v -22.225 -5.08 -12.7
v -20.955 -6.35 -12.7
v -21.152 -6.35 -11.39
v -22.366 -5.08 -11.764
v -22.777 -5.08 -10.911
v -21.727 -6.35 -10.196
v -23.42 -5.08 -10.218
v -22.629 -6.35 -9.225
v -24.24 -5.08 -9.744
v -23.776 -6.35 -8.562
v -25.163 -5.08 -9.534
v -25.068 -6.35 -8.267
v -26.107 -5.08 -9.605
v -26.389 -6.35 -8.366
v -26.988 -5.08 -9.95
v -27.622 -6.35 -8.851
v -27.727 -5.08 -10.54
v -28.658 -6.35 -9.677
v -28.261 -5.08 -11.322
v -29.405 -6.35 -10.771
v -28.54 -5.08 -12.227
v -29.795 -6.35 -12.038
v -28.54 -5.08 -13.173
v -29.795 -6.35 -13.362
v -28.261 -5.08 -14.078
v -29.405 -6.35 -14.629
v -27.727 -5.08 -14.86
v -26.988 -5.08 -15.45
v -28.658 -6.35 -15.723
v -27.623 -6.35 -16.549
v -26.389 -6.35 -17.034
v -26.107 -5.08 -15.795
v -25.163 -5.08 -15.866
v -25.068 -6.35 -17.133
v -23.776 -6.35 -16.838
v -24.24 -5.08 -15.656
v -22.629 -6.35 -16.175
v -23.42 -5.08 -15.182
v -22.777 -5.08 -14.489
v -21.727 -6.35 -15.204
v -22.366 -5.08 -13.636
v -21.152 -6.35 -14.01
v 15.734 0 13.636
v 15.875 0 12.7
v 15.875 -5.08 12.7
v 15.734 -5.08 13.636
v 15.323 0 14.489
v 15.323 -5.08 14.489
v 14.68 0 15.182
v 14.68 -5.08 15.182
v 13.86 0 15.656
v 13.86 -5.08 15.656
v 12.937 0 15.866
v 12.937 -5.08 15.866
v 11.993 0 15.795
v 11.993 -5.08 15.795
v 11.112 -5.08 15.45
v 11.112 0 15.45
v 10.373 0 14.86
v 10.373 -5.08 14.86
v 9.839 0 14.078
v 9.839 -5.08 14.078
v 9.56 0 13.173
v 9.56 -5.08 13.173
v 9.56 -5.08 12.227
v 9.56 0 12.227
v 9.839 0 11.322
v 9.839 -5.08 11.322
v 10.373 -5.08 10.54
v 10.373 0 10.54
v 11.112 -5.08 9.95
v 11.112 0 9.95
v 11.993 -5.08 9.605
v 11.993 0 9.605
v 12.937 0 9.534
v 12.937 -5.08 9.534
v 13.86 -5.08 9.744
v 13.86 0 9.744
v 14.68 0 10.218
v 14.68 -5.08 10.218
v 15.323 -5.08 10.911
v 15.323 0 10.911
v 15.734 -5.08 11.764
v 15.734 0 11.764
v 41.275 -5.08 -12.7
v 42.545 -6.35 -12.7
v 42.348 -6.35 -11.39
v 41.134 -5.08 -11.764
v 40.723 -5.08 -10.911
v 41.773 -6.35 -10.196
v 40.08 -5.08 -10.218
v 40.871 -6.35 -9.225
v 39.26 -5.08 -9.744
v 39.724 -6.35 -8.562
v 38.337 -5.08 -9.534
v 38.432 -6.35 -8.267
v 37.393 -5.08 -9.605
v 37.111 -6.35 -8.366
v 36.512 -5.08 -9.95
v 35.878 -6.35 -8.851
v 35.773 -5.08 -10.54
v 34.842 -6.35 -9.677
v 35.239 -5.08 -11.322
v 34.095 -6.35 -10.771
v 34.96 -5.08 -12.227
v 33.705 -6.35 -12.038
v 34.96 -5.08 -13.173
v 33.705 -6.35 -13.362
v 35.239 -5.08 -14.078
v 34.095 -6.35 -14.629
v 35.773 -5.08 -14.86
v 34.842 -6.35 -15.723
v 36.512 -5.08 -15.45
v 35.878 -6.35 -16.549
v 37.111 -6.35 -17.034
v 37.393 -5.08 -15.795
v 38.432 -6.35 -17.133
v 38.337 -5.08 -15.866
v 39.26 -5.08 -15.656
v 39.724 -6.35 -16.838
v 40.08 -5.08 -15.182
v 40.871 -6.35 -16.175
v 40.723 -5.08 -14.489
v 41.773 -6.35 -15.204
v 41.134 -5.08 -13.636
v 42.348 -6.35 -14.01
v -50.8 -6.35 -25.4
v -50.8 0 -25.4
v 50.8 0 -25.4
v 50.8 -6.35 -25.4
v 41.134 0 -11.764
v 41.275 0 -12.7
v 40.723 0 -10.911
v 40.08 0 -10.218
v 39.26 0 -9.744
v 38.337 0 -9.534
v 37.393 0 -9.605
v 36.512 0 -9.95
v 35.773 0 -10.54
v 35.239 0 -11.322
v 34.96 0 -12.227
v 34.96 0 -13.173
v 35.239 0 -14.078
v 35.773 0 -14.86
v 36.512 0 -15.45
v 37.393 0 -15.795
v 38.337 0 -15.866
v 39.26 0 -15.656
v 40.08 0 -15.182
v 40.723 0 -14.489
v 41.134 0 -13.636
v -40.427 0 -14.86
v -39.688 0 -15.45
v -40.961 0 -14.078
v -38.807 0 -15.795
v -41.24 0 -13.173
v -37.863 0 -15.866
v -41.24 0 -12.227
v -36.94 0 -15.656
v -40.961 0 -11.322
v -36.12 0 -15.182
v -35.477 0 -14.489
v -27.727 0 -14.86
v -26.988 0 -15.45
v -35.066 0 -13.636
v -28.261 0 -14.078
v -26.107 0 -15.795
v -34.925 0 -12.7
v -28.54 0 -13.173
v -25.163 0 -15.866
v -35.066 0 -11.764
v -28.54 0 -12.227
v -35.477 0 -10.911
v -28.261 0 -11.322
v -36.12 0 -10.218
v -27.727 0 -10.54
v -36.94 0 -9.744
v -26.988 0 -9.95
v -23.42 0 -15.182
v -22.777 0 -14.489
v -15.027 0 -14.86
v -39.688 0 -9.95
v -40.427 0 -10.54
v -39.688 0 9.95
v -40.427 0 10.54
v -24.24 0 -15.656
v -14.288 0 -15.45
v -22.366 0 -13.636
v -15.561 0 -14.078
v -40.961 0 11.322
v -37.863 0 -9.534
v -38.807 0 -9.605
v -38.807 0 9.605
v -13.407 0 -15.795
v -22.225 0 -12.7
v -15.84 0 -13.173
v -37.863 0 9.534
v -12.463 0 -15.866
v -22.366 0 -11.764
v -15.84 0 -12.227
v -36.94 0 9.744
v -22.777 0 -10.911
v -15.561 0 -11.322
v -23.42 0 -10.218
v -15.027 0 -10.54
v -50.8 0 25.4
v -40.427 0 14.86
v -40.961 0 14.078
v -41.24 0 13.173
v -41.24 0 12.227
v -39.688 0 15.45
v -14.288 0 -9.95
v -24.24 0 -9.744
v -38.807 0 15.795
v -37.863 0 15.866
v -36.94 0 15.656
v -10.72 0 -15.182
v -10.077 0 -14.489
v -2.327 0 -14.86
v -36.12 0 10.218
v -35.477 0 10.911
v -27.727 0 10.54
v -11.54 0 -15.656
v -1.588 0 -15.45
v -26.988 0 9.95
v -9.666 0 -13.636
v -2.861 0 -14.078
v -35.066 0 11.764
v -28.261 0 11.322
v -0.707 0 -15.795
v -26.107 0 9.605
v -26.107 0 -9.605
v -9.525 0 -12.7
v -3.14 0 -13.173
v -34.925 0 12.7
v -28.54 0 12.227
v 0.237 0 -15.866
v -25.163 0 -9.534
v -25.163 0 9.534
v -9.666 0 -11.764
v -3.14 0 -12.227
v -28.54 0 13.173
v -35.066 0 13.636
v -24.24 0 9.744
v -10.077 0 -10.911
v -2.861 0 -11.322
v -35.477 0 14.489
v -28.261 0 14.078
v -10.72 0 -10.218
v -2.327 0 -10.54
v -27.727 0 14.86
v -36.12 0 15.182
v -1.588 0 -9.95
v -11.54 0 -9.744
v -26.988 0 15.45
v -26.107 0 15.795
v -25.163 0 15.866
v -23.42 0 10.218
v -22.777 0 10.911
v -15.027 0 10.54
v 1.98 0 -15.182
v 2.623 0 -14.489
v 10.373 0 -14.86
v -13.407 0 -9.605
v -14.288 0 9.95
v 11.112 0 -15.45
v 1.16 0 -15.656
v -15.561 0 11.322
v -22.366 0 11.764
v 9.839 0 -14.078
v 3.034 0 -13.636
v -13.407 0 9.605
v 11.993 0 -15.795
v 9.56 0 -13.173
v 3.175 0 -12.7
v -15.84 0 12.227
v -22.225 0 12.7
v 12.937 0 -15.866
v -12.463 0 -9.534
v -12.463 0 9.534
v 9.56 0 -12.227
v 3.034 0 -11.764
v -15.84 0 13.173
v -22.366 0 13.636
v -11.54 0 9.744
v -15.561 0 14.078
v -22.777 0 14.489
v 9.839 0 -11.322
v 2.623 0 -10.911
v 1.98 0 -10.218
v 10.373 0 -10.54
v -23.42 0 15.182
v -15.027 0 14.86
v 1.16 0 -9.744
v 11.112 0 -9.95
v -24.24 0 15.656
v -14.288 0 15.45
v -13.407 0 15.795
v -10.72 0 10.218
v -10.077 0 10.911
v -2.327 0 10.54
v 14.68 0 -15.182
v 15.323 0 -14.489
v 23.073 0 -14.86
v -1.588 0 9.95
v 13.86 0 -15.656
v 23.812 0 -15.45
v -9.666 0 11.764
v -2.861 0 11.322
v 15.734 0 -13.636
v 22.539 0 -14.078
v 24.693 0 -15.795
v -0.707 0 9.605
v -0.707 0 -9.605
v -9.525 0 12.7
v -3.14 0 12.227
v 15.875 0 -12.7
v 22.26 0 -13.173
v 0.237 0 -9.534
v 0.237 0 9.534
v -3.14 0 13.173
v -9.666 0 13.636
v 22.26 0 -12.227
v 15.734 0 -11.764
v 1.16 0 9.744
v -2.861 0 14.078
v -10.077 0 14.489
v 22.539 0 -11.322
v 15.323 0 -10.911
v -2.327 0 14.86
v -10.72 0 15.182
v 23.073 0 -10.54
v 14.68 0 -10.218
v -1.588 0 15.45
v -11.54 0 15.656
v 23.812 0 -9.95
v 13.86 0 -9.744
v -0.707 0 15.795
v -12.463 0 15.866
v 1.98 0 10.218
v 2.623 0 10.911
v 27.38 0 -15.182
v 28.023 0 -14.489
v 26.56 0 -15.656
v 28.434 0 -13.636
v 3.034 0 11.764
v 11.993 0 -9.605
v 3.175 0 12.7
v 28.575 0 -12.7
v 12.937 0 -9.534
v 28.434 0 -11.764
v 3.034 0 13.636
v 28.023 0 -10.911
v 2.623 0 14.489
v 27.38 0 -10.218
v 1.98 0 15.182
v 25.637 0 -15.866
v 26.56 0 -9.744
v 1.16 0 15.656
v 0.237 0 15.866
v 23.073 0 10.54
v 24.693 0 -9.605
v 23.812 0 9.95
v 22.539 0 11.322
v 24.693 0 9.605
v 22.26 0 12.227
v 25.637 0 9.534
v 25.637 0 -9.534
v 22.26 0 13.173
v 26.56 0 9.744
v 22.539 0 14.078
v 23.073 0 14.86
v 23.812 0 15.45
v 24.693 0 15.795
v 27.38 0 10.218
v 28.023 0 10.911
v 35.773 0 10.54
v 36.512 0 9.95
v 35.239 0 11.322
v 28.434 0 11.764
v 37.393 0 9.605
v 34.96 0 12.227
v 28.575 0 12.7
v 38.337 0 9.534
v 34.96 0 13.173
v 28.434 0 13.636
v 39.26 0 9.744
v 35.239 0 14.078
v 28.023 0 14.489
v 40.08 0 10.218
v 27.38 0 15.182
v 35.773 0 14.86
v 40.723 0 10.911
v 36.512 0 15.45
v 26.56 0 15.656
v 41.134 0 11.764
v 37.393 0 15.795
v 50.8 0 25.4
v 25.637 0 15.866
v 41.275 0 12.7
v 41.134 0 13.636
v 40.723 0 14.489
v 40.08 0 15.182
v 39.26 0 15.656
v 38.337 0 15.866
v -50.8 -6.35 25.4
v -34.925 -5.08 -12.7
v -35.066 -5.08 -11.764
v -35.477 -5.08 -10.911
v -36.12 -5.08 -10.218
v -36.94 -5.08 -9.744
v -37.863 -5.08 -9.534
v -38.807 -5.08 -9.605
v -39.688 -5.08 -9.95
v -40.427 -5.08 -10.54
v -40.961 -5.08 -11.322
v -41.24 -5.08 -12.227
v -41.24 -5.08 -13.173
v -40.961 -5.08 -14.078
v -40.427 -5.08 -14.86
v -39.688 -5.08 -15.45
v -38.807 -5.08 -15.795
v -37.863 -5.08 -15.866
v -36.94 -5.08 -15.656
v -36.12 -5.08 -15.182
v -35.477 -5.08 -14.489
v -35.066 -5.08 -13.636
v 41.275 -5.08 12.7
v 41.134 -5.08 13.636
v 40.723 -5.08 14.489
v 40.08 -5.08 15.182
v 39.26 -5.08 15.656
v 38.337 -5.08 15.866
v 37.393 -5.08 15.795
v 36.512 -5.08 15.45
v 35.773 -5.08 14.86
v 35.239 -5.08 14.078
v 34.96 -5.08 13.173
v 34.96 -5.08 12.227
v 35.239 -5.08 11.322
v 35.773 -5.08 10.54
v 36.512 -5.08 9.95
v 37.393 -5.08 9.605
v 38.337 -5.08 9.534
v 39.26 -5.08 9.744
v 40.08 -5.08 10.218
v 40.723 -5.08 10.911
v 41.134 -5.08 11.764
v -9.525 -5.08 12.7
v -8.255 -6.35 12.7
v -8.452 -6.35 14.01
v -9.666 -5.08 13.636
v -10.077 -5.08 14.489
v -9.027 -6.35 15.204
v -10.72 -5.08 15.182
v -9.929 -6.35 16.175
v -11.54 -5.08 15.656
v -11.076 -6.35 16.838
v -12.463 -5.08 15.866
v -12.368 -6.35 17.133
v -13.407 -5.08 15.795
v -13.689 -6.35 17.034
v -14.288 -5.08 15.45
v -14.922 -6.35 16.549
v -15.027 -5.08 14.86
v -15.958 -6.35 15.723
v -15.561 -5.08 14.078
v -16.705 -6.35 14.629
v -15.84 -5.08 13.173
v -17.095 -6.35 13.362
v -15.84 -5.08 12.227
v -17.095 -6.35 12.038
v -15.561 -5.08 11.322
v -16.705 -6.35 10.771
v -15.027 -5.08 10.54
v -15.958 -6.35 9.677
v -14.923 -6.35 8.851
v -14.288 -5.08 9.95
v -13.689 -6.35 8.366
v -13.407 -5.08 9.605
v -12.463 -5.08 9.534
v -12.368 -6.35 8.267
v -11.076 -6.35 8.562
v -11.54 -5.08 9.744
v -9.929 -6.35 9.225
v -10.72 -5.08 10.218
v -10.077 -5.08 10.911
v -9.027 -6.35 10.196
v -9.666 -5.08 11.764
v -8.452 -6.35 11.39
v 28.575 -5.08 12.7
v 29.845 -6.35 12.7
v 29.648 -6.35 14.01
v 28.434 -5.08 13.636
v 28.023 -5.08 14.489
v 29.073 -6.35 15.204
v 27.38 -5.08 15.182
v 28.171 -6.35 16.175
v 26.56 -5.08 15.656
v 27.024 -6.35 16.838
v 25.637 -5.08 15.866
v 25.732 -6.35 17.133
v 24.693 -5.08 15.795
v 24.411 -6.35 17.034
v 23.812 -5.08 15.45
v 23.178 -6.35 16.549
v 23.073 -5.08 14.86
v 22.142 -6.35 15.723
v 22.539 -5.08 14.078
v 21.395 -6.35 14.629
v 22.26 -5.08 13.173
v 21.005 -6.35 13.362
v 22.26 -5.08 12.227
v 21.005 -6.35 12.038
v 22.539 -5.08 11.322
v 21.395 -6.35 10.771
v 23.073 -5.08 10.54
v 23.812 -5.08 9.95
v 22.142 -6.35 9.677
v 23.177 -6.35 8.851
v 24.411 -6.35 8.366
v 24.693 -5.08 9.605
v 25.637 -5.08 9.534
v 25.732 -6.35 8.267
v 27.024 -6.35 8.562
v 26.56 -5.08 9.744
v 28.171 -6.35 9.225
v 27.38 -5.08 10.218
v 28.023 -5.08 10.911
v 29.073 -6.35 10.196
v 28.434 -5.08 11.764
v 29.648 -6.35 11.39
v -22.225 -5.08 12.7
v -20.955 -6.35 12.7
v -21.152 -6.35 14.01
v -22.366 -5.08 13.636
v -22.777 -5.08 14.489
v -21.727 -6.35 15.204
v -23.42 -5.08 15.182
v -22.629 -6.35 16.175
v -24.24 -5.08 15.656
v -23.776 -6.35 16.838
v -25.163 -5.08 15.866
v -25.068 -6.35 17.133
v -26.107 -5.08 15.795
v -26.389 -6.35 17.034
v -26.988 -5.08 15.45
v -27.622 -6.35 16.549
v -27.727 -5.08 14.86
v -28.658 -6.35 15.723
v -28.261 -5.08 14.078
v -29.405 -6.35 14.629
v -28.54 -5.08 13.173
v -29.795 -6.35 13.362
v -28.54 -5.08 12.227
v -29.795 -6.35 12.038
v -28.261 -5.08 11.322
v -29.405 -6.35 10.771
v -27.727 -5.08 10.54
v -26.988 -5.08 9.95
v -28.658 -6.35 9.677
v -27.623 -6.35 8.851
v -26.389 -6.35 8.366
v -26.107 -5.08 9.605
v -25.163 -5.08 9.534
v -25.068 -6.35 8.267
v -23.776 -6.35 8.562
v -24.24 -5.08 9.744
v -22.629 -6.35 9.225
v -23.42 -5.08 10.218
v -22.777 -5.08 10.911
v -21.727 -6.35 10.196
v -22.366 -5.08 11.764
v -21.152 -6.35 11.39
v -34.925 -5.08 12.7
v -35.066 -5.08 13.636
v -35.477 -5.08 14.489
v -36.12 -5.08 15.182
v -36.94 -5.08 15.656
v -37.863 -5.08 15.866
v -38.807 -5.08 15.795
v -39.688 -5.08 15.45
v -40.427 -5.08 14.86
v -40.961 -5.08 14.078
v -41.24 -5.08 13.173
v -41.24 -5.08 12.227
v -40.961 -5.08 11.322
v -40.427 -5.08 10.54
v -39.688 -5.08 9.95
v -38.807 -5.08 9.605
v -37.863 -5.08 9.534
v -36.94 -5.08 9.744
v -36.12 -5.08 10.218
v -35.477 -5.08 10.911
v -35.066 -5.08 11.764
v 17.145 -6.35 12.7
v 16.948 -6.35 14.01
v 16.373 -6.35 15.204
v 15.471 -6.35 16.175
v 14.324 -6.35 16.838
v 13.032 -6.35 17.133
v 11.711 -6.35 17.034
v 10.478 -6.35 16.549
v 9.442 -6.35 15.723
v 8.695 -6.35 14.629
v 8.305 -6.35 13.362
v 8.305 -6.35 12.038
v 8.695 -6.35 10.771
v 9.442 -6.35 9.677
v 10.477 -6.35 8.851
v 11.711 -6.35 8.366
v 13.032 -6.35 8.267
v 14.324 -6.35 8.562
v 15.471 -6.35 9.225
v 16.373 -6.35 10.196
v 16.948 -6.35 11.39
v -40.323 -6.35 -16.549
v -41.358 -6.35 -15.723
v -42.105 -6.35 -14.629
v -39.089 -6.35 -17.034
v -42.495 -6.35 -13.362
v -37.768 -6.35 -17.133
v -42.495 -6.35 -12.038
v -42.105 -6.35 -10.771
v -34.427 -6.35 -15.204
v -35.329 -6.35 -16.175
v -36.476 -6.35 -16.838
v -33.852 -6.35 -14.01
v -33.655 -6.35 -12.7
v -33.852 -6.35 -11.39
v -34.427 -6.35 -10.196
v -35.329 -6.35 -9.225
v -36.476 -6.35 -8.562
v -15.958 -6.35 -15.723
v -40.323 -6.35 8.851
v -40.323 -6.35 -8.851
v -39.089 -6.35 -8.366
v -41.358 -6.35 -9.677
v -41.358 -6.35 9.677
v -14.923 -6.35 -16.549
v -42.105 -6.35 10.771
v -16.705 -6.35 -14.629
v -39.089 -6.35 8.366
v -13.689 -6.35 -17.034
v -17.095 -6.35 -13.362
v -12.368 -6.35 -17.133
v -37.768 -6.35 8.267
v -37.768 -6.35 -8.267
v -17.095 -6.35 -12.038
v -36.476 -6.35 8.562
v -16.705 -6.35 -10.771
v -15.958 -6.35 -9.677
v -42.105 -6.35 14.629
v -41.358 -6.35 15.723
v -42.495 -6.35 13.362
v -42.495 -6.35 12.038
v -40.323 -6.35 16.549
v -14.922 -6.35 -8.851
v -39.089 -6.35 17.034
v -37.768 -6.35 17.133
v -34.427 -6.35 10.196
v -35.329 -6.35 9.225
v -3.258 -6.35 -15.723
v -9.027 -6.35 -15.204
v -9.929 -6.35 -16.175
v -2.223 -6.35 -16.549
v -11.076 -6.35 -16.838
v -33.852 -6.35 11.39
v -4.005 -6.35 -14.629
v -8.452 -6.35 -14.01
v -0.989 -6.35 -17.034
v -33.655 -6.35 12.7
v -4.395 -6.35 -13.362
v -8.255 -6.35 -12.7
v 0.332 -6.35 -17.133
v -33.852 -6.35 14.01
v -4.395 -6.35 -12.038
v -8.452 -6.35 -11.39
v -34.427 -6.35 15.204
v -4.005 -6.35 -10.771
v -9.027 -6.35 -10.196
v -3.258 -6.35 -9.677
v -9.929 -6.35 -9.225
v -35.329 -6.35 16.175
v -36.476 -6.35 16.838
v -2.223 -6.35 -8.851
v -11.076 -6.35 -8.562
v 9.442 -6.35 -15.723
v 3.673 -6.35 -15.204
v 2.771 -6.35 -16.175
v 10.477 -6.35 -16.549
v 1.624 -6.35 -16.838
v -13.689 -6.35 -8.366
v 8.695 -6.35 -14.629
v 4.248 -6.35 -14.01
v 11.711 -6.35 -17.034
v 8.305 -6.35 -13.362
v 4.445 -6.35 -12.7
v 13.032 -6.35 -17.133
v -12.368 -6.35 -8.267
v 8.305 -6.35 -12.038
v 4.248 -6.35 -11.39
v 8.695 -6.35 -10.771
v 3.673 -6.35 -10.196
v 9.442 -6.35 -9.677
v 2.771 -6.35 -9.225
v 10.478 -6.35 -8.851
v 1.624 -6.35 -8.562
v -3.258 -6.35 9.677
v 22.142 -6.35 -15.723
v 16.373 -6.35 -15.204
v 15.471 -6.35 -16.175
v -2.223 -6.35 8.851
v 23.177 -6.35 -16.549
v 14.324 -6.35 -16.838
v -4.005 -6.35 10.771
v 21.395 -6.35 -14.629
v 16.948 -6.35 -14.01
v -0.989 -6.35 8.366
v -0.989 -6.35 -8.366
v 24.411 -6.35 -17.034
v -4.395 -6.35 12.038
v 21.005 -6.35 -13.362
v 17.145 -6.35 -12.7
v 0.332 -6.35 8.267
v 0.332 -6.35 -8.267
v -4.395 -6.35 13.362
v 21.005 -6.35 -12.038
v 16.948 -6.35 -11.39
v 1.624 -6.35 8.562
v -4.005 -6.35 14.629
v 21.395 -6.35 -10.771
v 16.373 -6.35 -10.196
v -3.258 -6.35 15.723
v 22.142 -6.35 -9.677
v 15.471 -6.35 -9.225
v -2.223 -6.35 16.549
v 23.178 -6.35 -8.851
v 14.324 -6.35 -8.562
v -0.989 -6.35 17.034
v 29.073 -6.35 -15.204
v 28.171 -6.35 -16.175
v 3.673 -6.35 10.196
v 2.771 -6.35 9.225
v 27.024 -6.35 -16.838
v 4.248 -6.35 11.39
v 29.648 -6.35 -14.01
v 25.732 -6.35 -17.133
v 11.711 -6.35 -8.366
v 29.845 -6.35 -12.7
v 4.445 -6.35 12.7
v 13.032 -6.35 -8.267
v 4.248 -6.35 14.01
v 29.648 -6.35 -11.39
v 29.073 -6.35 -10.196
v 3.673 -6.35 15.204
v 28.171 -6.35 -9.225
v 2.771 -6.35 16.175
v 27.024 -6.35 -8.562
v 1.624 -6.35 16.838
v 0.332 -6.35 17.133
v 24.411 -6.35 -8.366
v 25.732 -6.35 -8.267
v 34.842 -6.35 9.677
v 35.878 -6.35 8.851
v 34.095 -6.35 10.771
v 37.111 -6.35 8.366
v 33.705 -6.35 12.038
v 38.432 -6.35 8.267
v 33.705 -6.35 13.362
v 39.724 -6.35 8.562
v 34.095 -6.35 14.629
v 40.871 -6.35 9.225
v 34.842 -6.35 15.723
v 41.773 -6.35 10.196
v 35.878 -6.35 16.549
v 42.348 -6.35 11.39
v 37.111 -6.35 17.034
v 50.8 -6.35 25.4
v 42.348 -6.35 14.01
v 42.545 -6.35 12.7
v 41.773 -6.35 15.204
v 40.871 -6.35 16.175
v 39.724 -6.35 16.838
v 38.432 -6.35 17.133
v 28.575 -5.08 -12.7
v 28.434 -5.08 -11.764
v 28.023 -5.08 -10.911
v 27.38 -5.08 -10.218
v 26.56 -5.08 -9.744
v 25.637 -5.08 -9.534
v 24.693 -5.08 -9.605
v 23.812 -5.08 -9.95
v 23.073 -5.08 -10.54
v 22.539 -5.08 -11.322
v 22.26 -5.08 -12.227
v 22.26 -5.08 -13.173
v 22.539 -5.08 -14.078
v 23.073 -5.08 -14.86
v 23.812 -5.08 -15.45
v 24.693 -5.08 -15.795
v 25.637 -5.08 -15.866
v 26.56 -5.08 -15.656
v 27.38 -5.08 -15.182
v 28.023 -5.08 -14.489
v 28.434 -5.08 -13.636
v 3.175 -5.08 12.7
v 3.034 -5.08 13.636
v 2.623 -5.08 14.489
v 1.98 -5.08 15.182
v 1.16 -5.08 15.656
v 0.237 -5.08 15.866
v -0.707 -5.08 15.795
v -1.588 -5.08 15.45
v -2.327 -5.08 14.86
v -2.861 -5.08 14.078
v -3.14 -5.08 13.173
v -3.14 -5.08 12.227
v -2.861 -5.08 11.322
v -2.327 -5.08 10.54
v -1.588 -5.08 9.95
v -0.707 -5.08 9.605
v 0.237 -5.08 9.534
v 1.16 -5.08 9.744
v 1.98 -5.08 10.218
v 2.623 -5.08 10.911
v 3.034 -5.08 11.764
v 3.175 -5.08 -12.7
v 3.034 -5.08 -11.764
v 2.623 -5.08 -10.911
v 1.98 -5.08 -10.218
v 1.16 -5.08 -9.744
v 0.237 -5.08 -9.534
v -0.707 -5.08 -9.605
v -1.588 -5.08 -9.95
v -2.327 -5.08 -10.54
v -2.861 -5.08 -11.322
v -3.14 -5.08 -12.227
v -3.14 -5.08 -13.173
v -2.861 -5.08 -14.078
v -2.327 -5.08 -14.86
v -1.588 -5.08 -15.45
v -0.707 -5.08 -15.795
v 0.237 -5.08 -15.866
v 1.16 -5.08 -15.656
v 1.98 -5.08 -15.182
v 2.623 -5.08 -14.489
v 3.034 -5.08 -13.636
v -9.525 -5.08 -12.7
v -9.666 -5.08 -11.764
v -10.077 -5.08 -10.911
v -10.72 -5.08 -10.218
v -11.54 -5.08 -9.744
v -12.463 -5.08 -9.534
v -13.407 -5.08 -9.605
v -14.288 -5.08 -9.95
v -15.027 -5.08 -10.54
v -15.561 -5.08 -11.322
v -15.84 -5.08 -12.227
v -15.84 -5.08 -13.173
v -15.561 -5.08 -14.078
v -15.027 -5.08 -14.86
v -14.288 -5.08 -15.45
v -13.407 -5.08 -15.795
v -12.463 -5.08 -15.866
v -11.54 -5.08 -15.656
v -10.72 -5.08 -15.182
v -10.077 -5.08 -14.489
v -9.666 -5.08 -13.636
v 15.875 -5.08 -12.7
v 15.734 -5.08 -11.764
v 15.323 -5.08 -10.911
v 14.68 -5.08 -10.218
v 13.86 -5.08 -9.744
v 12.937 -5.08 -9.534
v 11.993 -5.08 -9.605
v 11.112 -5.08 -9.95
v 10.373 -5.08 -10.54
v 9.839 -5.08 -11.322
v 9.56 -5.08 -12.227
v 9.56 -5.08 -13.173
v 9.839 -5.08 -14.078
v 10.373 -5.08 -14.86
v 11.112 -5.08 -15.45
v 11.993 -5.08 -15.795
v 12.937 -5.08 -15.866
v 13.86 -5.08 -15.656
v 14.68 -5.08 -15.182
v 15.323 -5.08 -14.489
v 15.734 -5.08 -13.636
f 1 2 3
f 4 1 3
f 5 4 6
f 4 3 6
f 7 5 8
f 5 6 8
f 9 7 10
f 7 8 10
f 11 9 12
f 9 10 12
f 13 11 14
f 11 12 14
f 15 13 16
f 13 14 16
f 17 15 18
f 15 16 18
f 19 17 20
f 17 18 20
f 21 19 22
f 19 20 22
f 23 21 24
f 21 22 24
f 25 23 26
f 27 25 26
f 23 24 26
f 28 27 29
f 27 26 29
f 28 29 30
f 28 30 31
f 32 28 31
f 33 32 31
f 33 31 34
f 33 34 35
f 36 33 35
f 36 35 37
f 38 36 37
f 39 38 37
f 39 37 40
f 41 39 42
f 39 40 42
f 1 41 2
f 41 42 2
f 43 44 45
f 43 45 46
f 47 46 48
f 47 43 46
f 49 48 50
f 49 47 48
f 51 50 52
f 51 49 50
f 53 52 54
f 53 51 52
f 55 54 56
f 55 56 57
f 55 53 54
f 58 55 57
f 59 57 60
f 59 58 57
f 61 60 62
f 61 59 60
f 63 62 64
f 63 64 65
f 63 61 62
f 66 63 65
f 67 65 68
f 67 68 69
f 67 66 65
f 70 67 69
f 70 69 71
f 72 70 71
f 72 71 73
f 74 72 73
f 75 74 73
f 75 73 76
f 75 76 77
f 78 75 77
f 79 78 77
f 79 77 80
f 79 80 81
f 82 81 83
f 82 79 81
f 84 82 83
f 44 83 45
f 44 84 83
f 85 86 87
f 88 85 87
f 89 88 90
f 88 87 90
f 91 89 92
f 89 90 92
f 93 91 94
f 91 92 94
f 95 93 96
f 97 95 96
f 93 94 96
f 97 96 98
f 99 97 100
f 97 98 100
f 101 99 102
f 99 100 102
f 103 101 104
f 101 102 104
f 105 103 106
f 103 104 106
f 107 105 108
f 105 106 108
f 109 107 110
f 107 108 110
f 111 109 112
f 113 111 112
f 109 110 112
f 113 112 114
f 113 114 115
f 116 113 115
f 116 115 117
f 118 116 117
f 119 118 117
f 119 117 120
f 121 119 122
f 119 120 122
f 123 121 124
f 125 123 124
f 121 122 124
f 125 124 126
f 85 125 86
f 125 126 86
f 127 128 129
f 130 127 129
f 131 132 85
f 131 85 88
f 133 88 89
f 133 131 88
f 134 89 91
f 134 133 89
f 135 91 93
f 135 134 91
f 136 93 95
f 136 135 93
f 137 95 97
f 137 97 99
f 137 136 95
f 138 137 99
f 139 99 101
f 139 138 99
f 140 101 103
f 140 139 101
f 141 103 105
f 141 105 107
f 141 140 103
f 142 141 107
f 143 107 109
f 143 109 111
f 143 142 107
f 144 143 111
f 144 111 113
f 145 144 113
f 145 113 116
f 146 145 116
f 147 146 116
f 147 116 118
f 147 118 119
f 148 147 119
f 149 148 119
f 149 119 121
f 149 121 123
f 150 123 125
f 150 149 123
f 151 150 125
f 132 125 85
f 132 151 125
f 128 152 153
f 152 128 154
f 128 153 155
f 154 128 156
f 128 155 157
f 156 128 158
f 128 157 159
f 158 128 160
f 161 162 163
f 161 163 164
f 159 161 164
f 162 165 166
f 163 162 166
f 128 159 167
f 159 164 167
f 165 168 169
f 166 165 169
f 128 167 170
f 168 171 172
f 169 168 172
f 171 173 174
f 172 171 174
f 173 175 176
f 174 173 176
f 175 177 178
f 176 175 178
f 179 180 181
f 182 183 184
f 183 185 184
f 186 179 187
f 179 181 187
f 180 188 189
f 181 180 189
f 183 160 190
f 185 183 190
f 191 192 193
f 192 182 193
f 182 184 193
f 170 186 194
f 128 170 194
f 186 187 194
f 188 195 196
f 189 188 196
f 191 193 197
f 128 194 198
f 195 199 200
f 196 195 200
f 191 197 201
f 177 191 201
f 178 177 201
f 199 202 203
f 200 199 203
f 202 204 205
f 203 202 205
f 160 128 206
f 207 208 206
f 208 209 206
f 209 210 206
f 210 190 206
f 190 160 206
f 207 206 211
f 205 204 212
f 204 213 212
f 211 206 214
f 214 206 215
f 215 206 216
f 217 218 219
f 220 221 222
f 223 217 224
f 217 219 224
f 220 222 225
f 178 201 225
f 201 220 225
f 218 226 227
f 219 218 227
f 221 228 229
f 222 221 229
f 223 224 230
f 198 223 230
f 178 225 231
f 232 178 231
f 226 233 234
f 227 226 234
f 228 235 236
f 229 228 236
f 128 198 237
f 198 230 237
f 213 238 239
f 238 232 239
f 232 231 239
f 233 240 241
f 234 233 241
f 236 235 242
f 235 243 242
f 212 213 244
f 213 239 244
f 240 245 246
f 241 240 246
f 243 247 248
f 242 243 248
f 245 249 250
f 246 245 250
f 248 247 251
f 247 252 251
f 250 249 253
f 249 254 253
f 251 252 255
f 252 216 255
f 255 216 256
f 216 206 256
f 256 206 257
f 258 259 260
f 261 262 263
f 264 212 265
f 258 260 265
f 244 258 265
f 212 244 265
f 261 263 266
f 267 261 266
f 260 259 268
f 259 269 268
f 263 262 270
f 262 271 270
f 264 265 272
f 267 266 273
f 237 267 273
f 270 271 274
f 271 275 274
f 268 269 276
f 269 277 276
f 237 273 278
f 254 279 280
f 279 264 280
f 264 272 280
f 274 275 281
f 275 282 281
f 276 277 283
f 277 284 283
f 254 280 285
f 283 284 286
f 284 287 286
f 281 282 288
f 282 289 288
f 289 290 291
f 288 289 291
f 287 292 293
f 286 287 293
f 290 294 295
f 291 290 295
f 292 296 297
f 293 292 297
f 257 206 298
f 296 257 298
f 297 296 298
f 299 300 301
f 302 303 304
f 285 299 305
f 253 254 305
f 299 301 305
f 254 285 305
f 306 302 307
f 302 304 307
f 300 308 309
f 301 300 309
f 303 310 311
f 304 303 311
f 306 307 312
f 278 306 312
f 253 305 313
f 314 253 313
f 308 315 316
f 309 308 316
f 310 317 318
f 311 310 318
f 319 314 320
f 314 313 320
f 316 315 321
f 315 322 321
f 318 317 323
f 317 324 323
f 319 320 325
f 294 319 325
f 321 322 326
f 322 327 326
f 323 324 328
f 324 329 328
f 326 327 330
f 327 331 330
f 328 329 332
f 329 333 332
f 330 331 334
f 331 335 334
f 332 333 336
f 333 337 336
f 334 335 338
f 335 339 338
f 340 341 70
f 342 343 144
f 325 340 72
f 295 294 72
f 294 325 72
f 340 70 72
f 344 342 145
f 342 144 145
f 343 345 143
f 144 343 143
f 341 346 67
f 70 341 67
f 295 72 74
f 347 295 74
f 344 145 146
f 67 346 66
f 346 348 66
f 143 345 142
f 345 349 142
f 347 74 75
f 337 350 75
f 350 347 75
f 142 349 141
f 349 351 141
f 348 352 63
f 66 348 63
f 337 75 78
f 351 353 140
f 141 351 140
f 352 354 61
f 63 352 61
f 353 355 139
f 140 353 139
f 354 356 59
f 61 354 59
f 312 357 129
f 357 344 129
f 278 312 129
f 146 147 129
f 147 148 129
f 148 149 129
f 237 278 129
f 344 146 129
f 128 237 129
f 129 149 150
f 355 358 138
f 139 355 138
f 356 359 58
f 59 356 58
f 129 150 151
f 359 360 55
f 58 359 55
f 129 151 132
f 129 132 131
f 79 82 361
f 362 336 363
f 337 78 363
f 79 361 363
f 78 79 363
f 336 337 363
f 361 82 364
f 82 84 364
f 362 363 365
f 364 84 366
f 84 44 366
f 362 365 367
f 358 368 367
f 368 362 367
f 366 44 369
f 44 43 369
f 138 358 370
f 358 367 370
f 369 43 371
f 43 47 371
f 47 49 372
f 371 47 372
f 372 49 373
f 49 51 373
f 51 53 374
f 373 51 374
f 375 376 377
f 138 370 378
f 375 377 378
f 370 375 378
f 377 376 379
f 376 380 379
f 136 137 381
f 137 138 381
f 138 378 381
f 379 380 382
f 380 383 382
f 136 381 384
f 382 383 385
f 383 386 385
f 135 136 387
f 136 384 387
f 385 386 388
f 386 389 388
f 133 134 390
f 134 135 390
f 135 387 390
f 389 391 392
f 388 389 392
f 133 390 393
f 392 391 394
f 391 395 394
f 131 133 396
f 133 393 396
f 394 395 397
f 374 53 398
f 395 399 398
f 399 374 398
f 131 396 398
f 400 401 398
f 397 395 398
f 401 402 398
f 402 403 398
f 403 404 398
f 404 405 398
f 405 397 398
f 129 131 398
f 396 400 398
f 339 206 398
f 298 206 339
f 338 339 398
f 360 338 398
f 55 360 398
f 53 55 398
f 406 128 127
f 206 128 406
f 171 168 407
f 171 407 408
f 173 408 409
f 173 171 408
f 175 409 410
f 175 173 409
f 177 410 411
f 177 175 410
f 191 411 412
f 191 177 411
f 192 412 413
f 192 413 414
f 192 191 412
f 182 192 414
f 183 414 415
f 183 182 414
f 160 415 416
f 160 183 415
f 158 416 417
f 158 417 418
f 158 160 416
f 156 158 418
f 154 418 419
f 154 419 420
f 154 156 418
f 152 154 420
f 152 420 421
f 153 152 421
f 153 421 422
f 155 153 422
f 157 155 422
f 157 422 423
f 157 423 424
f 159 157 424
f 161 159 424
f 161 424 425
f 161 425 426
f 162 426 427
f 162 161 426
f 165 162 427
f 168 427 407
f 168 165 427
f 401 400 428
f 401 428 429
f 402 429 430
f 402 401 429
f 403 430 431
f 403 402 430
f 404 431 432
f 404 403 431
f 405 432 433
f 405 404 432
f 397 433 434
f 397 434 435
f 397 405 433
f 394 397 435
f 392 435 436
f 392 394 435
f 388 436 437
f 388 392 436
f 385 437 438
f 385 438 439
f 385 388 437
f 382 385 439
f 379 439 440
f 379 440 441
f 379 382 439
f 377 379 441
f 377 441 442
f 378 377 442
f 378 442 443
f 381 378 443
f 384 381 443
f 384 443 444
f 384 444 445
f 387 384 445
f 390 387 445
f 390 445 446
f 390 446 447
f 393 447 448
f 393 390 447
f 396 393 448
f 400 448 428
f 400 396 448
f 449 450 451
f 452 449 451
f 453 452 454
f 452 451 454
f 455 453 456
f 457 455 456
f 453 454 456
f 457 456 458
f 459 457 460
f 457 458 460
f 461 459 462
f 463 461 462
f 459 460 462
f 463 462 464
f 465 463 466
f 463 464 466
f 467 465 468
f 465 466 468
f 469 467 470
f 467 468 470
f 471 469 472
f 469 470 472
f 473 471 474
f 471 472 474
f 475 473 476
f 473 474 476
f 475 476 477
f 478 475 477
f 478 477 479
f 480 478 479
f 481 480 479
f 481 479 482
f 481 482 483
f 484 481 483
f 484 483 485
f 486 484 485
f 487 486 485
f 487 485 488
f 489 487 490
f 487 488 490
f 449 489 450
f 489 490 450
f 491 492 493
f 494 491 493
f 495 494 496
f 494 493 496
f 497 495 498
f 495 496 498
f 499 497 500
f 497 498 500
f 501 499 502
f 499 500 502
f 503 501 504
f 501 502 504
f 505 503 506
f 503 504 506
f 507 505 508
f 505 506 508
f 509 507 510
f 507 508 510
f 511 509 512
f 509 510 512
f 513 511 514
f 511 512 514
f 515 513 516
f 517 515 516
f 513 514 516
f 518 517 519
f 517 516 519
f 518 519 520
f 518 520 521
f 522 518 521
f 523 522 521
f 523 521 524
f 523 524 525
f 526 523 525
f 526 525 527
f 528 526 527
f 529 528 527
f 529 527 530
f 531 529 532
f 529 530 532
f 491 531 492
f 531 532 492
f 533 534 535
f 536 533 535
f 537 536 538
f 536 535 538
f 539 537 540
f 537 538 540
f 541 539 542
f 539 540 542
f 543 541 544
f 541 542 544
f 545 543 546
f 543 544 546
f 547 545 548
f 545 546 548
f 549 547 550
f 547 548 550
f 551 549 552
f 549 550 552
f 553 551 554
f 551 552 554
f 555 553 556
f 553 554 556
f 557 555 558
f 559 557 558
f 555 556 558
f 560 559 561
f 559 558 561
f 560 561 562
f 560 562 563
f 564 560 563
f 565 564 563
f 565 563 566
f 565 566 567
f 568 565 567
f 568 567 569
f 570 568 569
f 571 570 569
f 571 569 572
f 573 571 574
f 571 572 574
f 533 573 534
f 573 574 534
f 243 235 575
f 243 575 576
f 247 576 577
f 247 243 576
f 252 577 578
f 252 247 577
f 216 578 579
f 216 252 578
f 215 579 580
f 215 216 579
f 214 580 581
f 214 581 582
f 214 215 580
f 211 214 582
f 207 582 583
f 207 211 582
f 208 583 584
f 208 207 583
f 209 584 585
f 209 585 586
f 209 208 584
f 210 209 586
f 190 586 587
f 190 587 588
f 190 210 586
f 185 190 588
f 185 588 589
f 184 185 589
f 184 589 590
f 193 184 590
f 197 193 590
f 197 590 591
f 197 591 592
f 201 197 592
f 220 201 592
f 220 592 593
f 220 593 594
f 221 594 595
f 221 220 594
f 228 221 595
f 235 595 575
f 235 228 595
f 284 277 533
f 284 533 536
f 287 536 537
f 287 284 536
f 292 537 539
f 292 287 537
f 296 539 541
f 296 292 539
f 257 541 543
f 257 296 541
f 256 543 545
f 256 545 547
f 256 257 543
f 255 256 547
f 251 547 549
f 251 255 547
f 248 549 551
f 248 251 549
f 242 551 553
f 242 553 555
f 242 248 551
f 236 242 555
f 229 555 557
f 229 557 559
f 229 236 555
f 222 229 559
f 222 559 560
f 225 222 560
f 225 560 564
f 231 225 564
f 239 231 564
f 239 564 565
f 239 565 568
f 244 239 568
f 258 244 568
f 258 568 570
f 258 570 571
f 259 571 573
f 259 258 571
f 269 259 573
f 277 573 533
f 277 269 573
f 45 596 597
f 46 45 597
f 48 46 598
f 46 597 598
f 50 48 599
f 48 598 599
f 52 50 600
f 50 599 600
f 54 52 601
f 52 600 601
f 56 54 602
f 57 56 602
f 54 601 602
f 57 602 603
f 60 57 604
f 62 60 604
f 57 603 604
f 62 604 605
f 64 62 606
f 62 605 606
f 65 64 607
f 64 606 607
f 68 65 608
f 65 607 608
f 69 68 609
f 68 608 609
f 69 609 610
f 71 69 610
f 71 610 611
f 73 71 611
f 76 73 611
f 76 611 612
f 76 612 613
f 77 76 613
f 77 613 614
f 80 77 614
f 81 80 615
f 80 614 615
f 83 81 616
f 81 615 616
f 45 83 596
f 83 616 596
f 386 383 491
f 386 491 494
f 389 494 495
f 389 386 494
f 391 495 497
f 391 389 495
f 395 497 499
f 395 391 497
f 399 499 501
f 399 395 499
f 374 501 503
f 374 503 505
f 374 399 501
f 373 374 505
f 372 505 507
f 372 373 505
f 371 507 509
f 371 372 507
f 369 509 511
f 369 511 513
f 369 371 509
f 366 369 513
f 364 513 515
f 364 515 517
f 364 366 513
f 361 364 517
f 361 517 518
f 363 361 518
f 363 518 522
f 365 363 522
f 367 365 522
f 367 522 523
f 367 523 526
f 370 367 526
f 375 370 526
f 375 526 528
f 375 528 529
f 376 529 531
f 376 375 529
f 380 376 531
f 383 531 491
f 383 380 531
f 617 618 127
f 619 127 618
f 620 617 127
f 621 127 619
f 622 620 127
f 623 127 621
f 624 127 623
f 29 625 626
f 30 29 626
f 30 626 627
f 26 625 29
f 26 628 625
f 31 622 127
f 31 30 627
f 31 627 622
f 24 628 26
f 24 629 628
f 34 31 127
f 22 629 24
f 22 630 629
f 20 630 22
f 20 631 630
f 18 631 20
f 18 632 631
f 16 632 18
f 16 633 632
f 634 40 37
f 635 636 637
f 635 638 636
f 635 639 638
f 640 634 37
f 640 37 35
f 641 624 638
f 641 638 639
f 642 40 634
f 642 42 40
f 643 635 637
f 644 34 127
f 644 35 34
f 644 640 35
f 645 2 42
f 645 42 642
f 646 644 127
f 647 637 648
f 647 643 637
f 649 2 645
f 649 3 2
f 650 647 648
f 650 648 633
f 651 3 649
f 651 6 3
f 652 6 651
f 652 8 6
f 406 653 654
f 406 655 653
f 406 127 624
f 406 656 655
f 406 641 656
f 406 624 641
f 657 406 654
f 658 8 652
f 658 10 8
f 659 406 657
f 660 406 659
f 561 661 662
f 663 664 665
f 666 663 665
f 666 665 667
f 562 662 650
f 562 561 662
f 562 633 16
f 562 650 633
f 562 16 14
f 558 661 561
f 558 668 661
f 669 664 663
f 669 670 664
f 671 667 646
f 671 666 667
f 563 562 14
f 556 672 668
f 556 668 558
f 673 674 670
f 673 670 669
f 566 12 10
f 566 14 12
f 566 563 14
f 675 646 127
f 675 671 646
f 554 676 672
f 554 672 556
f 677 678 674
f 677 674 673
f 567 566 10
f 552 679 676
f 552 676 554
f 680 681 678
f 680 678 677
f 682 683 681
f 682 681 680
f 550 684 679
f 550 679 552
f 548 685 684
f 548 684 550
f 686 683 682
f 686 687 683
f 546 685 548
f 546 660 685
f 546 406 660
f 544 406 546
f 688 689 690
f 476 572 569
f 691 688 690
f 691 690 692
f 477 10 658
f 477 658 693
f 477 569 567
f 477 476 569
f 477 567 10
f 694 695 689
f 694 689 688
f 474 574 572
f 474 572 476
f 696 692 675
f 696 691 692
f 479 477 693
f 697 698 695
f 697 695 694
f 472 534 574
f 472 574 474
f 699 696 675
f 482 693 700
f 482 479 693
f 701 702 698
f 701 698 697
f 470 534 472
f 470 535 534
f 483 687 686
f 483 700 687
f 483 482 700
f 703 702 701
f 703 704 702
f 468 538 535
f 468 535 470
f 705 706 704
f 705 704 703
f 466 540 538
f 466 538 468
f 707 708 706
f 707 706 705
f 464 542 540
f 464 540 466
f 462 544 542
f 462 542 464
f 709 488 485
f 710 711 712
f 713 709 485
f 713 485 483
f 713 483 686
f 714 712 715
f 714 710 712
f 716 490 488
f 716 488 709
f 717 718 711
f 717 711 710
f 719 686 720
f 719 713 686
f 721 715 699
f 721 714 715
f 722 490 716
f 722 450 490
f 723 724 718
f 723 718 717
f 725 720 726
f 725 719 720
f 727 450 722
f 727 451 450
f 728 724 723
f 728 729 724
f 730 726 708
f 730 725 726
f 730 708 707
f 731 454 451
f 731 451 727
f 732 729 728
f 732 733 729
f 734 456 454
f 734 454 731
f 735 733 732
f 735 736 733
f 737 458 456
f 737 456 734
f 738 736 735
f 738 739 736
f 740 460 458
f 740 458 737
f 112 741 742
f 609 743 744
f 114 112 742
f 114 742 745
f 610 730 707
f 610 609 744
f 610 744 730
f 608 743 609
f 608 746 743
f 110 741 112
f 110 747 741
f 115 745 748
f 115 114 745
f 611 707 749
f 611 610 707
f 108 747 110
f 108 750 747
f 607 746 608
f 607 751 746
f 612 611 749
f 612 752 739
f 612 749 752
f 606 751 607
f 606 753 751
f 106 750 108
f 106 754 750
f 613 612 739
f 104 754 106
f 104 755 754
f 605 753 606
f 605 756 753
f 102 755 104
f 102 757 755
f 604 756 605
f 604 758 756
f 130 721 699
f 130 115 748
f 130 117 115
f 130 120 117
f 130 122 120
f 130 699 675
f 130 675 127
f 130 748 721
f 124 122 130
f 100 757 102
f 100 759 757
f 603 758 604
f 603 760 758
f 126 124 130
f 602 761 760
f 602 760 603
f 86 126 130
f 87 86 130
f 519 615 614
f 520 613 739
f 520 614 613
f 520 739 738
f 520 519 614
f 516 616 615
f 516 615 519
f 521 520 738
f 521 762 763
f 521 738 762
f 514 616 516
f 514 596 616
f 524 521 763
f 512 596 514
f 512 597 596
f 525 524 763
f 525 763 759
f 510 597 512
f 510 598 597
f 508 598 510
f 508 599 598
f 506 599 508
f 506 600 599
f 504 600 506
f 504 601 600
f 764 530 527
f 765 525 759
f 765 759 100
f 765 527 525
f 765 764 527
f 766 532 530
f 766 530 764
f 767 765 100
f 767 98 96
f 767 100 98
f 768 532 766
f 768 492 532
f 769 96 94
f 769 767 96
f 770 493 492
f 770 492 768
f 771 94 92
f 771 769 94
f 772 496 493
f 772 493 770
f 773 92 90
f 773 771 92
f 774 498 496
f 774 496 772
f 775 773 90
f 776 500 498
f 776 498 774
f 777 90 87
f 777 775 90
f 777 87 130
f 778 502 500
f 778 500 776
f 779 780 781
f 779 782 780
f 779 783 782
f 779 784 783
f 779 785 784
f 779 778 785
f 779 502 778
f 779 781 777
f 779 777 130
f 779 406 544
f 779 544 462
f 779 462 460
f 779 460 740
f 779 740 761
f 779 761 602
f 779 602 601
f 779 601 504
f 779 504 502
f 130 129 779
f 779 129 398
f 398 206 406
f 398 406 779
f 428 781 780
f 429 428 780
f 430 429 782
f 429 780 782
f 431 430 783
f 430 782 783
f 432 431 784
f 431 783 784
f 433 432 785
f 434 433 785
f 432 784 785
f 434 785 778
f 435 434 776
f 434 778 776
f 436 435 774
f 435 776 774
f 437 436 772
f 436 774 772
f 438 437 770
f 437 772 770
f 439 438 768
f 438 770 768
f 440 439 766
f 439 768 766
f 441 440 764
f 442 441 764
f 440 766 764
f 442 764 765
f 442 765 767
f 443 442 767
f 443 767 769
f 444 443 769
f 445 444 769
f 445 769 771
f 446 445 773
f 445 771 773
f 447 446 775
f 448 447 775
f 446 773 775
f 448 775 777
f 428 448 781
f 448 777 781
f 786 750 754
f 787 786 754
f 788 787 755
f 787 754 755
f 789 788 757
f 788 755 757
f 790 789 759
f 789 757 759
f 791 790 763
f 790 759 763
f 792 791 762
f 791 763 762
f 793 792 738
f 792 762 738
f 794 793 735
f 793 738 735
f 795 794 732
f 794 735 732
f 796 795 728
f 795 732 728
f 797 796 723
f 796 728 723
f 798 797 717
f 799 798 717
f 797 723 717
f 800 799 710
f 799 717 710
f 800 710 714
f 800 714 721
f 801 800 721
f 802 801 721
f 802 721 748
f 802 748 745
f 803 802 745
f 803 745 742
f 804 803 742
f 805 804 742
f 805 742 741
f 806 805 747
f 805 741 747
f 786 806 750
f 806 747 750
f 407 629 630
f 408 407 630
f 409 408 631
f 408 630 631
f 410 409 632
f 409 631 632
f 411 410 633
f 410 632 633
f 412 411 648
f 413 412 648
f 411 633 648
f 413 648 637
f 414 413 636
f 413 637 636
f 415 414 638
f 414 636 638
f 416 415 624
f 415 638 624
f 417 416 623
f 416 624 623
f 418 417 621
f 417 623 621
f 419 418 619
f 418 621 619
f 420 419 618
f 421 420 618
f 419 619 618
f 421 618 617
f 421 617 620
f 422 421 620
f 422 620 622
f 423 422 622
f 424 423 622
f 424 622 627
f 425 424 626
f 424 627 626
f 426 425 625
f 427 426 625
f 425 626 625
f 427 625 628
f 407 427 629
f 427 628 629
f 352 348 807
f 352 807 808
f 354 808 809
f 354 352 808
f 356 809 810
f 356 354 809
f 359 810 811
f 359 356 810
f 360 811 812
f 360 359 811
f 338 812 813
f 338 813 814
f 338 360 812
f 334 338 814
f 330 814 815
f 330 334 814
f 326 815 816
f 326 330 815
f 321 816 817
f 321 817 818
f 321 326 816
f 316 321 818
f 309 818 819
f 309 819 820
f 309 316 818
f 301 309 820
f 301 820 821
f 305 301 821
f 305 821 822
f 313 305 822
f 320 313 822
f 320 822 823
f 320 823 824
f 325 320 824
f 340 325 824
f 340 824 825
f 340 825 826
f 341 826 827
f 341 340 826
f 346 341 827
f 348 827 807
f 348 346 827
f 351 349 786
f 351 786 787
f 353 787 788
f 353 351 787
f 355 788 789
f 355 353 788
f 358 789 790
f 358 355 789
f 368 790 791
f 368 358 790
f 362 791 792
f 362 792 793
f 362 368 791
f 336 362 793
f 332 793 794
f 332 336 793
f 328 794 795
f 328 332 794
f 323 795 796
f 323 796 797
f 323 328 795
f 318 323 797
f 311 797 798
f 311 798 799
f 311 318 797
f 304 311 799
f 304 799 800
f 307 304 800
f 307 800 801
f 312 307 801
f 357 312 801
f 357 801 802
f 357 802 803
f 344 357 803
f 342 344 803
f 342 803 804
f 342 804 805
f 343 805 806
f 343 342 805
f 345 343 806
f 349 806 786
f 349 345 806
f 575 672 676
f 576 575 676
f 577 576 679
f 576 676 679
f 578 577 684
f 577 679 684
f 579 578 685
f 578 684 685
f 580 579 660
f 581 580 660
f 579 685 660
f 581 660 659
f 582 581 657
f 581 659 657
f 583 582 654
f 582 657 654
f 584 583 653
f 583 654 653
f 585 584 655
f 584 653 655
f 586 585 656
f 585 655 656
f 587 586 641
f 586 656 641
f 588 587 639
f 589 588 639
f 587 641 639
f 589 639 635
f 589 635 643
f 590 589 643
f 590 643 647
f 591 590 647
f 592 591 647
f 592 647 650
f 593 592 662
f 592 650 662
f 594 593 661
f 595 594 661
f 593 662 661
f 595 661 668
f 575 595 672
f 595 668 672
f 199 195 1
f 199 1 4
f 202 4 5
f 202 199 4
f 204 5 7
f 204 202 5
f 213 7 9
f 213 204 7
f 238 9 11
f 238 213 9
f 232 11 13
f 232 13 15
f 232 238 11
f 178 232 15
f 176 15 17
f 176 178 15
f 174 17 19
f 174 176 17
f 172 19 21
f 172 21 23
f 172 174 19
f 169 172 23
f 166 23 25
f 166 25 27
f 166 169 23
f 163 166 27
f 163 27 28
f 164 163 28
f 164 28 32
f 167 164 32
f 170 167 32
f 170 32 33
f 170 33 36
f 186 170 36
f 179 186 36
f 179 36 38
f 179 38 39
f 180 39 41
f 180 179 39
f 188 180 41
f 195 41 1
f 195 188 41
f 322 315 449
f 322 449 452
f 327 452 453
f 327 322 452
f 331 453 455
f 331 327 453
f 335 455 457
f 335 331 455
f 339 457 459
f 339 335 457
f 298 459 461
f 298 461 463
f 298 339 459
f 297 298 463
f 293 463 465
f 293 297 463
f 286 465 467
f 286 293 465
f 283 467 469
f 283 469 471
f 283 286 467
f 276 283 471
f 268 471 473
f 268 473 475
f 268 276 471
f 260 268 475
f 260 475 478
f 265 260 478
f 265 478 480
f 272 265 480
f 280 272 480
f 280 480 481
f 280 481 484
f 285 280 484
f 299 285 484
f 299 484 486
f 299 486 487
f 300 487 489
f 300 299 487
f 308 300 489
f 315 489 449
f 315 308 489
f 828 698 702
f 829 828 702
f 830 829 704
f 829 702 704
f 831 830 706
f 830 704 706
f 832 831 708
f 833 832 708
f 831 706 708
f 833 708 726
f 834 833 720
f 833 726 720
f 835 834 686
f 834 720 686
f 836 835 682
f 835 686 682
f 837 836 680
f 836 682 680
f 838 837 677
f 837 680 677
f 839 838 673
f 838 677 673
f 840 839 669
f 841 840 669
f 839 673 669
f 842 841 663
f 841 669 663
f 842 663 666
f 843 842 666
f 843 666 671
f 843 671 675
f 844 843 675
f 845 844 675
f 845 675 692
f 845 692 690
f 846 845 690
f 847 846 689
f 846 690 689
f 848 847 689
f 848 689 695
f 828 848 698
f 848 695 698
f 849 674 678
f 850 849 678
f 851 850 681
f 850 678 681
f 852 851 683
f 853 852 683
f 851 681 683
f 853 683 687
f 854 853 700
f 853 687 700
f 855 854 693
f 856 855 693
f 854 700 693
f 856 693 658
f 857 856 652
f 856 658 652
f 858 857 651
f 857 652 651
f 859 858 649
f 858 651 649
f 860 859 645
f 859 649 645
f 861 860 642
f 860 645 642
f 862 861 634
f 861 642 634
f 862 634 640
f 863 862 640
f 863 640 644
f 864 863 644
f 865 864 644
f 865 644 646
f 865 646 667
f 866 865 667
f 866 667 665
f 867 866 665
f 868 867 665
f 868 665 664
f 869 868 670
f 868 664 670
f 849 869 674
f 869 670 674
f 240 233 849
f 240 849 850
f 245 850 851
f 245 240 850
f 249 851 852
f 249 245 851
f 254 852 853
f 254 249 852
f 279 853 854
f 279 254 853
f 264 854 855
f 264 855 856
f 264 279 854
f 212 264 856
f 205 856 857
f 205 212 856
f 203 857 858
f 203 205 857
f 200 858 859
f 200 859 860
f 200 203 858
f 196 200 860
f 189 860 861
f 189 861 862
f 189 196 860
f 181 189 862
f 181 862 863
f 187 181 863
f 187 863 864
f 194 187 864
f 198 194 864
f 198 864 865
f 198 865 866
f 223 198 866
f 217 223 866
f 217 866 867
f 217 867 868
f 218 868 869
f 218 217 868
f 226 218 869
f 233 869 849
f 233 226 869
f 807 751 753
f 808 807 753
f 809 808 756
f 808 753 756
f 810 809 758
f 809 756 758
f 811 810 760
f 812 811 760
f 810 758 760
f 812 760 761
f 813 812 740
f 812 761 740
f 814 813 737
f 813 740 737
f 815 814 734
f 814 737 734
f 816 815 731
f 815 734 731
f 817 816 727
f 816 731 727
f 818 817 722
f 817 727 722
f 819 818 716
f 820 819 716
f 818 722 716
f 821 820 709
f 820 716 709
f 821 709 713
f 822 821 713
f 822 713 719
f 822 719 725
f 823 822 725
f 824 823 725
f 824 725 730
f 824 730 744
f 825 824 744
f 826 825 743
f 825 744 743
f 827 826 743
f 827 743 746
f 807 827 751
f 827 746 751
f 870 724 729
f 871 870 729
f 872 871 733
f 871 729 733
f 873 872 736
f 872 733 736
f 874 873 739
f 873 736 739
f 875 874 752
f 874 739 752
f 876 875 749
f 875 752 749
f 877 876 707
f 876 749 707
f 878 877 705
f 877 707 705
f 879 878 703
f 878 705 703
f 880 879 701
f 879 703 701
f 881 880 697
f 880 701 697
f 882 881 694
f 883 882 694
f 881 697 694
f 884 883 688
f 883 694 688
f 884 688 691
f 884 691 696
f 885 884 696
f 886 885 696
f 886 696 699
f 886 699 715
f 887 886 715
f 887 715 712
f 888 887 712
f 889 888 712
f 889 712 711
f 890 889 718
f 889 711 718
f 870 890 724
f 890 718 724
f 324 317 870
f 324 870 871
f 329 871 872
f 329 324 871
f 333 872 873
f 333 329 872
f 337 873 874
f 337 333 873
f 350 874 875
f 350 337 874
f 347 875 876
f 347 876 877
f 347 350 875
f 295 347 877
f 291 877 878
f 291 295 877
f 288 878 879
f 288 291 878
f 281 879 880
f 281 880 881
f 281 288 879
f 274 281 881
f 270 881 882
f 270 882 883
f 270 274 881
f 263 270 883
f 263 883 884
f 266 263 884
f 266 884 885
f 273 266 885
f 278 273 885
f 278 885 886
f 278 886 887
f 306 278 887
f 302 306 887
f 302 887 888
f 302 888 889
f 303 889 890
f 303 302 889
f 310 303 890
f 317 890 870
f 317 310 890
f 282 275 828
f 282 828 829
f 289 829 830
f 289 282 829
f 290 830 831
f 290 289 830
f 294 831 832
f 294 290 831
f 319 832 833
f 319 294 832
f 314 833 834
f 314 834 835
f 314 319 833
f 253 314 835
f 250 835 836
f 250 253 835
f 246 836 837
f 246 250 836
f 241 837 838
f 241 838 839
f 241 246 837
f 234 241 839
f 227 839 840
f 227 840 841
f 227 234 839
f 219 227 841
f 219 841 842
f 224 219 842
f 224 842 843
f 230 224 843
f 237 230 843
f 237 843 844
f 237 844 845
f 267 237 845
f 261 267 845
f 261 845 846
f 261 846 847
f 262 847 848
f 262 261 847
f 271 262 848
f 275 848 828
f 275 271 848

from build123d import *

# Parameters (mm, degrees)
F0_W     = 101.6
F0_H     = 50.8
F0_R     = 3.175
F1_DEPTH = 6.35
F2_SIZE  = 1.27


with BuildPart() as f1:
    # F0 (on Front) → F1 (new body)
    with BuildSketch(Plane.XZ):
        Rectangle(F0_W, F0_H)
        with Locations((-38.1, -12.7)):
            Circle(F0_R, mode=Mode.SUBTRACT)
        with Locations((-25.4, -12.7)):
            Circle(F0_R, mode=Mode.SUBTRACT)
        with Locations((-12.7, -12.7)):
            Circle(F0_R, mode=Mode.SUBTRACT)
        with Locations((0, -12.7)):
            Circle(F0_R, mode=Mode.SUBTRACT)
        with Locations((12.7, -12.7)):
            Circle(F0_R, mode=Mode.SUBTRACT)
        with Locations((25.4, -12.7)):
            Circle(F0_R, mode=Mode.SUBTRACT)
        with Locations((38.1, -12.7)):
            Circle(F0_R, mode=Mode.SUBTRACT)
        with Locations((-38.1, 12.7)):
            Circle(F0_R, mode=Mode.SUBTRACT)
        with Locations((-25.4, 12.7)):
            Circle(F0_R, mode=Mode.SUBTRACT)
        with Locations((-12.7, 12.7)):
            Circle(F0_R, mode=Mode.SUBTRACT)
        with Locations((0, 12.7)):
            Circle(F0_R, mode=Mode.SUBTRACT)
        with Locations((12.7, 12.7)):
            Circle(F0_R, mode=Mode.SUBTRACT)
        with Locations((25.4, 12.7)):
            Circle(F0_R, mode=Mode.SUBTRACT)
        with Locations((38.1, 12.7)):
            Circle(F0_R, mode=Mode.SUBTRACT)
    extrude(amount=F1_DEPTH)

    # F2
    f2_edges = [f1.edges().sort_by_distance(p)[0] for p in [
        (-41.275, -6.35, 12.7),
        (-28.575, -6.35, 12.7),
        (-15.875, -6.35, 12.7),
        (-3.175, -6.35, 12.7),
        (9.525, -6.35, 12.7),
        (22.225, -6.35, 12.7),
        (34.925, -6.35, 12.7),
        (34.925, -6.35, -12.7),
        (22.225, -6.35, -12.7),
        (9.525, -6.35, -12.7),
        (-3.175, -6.35, -12.7),
        (-15.875, -6.35, -12.7),
        (-41.275, -6.35, -12.7),
        (-28.575, -6.35, -12.7),
    ]]
    chamfer(f2_edges, length=F2_SIZE)


solid = f1.part
